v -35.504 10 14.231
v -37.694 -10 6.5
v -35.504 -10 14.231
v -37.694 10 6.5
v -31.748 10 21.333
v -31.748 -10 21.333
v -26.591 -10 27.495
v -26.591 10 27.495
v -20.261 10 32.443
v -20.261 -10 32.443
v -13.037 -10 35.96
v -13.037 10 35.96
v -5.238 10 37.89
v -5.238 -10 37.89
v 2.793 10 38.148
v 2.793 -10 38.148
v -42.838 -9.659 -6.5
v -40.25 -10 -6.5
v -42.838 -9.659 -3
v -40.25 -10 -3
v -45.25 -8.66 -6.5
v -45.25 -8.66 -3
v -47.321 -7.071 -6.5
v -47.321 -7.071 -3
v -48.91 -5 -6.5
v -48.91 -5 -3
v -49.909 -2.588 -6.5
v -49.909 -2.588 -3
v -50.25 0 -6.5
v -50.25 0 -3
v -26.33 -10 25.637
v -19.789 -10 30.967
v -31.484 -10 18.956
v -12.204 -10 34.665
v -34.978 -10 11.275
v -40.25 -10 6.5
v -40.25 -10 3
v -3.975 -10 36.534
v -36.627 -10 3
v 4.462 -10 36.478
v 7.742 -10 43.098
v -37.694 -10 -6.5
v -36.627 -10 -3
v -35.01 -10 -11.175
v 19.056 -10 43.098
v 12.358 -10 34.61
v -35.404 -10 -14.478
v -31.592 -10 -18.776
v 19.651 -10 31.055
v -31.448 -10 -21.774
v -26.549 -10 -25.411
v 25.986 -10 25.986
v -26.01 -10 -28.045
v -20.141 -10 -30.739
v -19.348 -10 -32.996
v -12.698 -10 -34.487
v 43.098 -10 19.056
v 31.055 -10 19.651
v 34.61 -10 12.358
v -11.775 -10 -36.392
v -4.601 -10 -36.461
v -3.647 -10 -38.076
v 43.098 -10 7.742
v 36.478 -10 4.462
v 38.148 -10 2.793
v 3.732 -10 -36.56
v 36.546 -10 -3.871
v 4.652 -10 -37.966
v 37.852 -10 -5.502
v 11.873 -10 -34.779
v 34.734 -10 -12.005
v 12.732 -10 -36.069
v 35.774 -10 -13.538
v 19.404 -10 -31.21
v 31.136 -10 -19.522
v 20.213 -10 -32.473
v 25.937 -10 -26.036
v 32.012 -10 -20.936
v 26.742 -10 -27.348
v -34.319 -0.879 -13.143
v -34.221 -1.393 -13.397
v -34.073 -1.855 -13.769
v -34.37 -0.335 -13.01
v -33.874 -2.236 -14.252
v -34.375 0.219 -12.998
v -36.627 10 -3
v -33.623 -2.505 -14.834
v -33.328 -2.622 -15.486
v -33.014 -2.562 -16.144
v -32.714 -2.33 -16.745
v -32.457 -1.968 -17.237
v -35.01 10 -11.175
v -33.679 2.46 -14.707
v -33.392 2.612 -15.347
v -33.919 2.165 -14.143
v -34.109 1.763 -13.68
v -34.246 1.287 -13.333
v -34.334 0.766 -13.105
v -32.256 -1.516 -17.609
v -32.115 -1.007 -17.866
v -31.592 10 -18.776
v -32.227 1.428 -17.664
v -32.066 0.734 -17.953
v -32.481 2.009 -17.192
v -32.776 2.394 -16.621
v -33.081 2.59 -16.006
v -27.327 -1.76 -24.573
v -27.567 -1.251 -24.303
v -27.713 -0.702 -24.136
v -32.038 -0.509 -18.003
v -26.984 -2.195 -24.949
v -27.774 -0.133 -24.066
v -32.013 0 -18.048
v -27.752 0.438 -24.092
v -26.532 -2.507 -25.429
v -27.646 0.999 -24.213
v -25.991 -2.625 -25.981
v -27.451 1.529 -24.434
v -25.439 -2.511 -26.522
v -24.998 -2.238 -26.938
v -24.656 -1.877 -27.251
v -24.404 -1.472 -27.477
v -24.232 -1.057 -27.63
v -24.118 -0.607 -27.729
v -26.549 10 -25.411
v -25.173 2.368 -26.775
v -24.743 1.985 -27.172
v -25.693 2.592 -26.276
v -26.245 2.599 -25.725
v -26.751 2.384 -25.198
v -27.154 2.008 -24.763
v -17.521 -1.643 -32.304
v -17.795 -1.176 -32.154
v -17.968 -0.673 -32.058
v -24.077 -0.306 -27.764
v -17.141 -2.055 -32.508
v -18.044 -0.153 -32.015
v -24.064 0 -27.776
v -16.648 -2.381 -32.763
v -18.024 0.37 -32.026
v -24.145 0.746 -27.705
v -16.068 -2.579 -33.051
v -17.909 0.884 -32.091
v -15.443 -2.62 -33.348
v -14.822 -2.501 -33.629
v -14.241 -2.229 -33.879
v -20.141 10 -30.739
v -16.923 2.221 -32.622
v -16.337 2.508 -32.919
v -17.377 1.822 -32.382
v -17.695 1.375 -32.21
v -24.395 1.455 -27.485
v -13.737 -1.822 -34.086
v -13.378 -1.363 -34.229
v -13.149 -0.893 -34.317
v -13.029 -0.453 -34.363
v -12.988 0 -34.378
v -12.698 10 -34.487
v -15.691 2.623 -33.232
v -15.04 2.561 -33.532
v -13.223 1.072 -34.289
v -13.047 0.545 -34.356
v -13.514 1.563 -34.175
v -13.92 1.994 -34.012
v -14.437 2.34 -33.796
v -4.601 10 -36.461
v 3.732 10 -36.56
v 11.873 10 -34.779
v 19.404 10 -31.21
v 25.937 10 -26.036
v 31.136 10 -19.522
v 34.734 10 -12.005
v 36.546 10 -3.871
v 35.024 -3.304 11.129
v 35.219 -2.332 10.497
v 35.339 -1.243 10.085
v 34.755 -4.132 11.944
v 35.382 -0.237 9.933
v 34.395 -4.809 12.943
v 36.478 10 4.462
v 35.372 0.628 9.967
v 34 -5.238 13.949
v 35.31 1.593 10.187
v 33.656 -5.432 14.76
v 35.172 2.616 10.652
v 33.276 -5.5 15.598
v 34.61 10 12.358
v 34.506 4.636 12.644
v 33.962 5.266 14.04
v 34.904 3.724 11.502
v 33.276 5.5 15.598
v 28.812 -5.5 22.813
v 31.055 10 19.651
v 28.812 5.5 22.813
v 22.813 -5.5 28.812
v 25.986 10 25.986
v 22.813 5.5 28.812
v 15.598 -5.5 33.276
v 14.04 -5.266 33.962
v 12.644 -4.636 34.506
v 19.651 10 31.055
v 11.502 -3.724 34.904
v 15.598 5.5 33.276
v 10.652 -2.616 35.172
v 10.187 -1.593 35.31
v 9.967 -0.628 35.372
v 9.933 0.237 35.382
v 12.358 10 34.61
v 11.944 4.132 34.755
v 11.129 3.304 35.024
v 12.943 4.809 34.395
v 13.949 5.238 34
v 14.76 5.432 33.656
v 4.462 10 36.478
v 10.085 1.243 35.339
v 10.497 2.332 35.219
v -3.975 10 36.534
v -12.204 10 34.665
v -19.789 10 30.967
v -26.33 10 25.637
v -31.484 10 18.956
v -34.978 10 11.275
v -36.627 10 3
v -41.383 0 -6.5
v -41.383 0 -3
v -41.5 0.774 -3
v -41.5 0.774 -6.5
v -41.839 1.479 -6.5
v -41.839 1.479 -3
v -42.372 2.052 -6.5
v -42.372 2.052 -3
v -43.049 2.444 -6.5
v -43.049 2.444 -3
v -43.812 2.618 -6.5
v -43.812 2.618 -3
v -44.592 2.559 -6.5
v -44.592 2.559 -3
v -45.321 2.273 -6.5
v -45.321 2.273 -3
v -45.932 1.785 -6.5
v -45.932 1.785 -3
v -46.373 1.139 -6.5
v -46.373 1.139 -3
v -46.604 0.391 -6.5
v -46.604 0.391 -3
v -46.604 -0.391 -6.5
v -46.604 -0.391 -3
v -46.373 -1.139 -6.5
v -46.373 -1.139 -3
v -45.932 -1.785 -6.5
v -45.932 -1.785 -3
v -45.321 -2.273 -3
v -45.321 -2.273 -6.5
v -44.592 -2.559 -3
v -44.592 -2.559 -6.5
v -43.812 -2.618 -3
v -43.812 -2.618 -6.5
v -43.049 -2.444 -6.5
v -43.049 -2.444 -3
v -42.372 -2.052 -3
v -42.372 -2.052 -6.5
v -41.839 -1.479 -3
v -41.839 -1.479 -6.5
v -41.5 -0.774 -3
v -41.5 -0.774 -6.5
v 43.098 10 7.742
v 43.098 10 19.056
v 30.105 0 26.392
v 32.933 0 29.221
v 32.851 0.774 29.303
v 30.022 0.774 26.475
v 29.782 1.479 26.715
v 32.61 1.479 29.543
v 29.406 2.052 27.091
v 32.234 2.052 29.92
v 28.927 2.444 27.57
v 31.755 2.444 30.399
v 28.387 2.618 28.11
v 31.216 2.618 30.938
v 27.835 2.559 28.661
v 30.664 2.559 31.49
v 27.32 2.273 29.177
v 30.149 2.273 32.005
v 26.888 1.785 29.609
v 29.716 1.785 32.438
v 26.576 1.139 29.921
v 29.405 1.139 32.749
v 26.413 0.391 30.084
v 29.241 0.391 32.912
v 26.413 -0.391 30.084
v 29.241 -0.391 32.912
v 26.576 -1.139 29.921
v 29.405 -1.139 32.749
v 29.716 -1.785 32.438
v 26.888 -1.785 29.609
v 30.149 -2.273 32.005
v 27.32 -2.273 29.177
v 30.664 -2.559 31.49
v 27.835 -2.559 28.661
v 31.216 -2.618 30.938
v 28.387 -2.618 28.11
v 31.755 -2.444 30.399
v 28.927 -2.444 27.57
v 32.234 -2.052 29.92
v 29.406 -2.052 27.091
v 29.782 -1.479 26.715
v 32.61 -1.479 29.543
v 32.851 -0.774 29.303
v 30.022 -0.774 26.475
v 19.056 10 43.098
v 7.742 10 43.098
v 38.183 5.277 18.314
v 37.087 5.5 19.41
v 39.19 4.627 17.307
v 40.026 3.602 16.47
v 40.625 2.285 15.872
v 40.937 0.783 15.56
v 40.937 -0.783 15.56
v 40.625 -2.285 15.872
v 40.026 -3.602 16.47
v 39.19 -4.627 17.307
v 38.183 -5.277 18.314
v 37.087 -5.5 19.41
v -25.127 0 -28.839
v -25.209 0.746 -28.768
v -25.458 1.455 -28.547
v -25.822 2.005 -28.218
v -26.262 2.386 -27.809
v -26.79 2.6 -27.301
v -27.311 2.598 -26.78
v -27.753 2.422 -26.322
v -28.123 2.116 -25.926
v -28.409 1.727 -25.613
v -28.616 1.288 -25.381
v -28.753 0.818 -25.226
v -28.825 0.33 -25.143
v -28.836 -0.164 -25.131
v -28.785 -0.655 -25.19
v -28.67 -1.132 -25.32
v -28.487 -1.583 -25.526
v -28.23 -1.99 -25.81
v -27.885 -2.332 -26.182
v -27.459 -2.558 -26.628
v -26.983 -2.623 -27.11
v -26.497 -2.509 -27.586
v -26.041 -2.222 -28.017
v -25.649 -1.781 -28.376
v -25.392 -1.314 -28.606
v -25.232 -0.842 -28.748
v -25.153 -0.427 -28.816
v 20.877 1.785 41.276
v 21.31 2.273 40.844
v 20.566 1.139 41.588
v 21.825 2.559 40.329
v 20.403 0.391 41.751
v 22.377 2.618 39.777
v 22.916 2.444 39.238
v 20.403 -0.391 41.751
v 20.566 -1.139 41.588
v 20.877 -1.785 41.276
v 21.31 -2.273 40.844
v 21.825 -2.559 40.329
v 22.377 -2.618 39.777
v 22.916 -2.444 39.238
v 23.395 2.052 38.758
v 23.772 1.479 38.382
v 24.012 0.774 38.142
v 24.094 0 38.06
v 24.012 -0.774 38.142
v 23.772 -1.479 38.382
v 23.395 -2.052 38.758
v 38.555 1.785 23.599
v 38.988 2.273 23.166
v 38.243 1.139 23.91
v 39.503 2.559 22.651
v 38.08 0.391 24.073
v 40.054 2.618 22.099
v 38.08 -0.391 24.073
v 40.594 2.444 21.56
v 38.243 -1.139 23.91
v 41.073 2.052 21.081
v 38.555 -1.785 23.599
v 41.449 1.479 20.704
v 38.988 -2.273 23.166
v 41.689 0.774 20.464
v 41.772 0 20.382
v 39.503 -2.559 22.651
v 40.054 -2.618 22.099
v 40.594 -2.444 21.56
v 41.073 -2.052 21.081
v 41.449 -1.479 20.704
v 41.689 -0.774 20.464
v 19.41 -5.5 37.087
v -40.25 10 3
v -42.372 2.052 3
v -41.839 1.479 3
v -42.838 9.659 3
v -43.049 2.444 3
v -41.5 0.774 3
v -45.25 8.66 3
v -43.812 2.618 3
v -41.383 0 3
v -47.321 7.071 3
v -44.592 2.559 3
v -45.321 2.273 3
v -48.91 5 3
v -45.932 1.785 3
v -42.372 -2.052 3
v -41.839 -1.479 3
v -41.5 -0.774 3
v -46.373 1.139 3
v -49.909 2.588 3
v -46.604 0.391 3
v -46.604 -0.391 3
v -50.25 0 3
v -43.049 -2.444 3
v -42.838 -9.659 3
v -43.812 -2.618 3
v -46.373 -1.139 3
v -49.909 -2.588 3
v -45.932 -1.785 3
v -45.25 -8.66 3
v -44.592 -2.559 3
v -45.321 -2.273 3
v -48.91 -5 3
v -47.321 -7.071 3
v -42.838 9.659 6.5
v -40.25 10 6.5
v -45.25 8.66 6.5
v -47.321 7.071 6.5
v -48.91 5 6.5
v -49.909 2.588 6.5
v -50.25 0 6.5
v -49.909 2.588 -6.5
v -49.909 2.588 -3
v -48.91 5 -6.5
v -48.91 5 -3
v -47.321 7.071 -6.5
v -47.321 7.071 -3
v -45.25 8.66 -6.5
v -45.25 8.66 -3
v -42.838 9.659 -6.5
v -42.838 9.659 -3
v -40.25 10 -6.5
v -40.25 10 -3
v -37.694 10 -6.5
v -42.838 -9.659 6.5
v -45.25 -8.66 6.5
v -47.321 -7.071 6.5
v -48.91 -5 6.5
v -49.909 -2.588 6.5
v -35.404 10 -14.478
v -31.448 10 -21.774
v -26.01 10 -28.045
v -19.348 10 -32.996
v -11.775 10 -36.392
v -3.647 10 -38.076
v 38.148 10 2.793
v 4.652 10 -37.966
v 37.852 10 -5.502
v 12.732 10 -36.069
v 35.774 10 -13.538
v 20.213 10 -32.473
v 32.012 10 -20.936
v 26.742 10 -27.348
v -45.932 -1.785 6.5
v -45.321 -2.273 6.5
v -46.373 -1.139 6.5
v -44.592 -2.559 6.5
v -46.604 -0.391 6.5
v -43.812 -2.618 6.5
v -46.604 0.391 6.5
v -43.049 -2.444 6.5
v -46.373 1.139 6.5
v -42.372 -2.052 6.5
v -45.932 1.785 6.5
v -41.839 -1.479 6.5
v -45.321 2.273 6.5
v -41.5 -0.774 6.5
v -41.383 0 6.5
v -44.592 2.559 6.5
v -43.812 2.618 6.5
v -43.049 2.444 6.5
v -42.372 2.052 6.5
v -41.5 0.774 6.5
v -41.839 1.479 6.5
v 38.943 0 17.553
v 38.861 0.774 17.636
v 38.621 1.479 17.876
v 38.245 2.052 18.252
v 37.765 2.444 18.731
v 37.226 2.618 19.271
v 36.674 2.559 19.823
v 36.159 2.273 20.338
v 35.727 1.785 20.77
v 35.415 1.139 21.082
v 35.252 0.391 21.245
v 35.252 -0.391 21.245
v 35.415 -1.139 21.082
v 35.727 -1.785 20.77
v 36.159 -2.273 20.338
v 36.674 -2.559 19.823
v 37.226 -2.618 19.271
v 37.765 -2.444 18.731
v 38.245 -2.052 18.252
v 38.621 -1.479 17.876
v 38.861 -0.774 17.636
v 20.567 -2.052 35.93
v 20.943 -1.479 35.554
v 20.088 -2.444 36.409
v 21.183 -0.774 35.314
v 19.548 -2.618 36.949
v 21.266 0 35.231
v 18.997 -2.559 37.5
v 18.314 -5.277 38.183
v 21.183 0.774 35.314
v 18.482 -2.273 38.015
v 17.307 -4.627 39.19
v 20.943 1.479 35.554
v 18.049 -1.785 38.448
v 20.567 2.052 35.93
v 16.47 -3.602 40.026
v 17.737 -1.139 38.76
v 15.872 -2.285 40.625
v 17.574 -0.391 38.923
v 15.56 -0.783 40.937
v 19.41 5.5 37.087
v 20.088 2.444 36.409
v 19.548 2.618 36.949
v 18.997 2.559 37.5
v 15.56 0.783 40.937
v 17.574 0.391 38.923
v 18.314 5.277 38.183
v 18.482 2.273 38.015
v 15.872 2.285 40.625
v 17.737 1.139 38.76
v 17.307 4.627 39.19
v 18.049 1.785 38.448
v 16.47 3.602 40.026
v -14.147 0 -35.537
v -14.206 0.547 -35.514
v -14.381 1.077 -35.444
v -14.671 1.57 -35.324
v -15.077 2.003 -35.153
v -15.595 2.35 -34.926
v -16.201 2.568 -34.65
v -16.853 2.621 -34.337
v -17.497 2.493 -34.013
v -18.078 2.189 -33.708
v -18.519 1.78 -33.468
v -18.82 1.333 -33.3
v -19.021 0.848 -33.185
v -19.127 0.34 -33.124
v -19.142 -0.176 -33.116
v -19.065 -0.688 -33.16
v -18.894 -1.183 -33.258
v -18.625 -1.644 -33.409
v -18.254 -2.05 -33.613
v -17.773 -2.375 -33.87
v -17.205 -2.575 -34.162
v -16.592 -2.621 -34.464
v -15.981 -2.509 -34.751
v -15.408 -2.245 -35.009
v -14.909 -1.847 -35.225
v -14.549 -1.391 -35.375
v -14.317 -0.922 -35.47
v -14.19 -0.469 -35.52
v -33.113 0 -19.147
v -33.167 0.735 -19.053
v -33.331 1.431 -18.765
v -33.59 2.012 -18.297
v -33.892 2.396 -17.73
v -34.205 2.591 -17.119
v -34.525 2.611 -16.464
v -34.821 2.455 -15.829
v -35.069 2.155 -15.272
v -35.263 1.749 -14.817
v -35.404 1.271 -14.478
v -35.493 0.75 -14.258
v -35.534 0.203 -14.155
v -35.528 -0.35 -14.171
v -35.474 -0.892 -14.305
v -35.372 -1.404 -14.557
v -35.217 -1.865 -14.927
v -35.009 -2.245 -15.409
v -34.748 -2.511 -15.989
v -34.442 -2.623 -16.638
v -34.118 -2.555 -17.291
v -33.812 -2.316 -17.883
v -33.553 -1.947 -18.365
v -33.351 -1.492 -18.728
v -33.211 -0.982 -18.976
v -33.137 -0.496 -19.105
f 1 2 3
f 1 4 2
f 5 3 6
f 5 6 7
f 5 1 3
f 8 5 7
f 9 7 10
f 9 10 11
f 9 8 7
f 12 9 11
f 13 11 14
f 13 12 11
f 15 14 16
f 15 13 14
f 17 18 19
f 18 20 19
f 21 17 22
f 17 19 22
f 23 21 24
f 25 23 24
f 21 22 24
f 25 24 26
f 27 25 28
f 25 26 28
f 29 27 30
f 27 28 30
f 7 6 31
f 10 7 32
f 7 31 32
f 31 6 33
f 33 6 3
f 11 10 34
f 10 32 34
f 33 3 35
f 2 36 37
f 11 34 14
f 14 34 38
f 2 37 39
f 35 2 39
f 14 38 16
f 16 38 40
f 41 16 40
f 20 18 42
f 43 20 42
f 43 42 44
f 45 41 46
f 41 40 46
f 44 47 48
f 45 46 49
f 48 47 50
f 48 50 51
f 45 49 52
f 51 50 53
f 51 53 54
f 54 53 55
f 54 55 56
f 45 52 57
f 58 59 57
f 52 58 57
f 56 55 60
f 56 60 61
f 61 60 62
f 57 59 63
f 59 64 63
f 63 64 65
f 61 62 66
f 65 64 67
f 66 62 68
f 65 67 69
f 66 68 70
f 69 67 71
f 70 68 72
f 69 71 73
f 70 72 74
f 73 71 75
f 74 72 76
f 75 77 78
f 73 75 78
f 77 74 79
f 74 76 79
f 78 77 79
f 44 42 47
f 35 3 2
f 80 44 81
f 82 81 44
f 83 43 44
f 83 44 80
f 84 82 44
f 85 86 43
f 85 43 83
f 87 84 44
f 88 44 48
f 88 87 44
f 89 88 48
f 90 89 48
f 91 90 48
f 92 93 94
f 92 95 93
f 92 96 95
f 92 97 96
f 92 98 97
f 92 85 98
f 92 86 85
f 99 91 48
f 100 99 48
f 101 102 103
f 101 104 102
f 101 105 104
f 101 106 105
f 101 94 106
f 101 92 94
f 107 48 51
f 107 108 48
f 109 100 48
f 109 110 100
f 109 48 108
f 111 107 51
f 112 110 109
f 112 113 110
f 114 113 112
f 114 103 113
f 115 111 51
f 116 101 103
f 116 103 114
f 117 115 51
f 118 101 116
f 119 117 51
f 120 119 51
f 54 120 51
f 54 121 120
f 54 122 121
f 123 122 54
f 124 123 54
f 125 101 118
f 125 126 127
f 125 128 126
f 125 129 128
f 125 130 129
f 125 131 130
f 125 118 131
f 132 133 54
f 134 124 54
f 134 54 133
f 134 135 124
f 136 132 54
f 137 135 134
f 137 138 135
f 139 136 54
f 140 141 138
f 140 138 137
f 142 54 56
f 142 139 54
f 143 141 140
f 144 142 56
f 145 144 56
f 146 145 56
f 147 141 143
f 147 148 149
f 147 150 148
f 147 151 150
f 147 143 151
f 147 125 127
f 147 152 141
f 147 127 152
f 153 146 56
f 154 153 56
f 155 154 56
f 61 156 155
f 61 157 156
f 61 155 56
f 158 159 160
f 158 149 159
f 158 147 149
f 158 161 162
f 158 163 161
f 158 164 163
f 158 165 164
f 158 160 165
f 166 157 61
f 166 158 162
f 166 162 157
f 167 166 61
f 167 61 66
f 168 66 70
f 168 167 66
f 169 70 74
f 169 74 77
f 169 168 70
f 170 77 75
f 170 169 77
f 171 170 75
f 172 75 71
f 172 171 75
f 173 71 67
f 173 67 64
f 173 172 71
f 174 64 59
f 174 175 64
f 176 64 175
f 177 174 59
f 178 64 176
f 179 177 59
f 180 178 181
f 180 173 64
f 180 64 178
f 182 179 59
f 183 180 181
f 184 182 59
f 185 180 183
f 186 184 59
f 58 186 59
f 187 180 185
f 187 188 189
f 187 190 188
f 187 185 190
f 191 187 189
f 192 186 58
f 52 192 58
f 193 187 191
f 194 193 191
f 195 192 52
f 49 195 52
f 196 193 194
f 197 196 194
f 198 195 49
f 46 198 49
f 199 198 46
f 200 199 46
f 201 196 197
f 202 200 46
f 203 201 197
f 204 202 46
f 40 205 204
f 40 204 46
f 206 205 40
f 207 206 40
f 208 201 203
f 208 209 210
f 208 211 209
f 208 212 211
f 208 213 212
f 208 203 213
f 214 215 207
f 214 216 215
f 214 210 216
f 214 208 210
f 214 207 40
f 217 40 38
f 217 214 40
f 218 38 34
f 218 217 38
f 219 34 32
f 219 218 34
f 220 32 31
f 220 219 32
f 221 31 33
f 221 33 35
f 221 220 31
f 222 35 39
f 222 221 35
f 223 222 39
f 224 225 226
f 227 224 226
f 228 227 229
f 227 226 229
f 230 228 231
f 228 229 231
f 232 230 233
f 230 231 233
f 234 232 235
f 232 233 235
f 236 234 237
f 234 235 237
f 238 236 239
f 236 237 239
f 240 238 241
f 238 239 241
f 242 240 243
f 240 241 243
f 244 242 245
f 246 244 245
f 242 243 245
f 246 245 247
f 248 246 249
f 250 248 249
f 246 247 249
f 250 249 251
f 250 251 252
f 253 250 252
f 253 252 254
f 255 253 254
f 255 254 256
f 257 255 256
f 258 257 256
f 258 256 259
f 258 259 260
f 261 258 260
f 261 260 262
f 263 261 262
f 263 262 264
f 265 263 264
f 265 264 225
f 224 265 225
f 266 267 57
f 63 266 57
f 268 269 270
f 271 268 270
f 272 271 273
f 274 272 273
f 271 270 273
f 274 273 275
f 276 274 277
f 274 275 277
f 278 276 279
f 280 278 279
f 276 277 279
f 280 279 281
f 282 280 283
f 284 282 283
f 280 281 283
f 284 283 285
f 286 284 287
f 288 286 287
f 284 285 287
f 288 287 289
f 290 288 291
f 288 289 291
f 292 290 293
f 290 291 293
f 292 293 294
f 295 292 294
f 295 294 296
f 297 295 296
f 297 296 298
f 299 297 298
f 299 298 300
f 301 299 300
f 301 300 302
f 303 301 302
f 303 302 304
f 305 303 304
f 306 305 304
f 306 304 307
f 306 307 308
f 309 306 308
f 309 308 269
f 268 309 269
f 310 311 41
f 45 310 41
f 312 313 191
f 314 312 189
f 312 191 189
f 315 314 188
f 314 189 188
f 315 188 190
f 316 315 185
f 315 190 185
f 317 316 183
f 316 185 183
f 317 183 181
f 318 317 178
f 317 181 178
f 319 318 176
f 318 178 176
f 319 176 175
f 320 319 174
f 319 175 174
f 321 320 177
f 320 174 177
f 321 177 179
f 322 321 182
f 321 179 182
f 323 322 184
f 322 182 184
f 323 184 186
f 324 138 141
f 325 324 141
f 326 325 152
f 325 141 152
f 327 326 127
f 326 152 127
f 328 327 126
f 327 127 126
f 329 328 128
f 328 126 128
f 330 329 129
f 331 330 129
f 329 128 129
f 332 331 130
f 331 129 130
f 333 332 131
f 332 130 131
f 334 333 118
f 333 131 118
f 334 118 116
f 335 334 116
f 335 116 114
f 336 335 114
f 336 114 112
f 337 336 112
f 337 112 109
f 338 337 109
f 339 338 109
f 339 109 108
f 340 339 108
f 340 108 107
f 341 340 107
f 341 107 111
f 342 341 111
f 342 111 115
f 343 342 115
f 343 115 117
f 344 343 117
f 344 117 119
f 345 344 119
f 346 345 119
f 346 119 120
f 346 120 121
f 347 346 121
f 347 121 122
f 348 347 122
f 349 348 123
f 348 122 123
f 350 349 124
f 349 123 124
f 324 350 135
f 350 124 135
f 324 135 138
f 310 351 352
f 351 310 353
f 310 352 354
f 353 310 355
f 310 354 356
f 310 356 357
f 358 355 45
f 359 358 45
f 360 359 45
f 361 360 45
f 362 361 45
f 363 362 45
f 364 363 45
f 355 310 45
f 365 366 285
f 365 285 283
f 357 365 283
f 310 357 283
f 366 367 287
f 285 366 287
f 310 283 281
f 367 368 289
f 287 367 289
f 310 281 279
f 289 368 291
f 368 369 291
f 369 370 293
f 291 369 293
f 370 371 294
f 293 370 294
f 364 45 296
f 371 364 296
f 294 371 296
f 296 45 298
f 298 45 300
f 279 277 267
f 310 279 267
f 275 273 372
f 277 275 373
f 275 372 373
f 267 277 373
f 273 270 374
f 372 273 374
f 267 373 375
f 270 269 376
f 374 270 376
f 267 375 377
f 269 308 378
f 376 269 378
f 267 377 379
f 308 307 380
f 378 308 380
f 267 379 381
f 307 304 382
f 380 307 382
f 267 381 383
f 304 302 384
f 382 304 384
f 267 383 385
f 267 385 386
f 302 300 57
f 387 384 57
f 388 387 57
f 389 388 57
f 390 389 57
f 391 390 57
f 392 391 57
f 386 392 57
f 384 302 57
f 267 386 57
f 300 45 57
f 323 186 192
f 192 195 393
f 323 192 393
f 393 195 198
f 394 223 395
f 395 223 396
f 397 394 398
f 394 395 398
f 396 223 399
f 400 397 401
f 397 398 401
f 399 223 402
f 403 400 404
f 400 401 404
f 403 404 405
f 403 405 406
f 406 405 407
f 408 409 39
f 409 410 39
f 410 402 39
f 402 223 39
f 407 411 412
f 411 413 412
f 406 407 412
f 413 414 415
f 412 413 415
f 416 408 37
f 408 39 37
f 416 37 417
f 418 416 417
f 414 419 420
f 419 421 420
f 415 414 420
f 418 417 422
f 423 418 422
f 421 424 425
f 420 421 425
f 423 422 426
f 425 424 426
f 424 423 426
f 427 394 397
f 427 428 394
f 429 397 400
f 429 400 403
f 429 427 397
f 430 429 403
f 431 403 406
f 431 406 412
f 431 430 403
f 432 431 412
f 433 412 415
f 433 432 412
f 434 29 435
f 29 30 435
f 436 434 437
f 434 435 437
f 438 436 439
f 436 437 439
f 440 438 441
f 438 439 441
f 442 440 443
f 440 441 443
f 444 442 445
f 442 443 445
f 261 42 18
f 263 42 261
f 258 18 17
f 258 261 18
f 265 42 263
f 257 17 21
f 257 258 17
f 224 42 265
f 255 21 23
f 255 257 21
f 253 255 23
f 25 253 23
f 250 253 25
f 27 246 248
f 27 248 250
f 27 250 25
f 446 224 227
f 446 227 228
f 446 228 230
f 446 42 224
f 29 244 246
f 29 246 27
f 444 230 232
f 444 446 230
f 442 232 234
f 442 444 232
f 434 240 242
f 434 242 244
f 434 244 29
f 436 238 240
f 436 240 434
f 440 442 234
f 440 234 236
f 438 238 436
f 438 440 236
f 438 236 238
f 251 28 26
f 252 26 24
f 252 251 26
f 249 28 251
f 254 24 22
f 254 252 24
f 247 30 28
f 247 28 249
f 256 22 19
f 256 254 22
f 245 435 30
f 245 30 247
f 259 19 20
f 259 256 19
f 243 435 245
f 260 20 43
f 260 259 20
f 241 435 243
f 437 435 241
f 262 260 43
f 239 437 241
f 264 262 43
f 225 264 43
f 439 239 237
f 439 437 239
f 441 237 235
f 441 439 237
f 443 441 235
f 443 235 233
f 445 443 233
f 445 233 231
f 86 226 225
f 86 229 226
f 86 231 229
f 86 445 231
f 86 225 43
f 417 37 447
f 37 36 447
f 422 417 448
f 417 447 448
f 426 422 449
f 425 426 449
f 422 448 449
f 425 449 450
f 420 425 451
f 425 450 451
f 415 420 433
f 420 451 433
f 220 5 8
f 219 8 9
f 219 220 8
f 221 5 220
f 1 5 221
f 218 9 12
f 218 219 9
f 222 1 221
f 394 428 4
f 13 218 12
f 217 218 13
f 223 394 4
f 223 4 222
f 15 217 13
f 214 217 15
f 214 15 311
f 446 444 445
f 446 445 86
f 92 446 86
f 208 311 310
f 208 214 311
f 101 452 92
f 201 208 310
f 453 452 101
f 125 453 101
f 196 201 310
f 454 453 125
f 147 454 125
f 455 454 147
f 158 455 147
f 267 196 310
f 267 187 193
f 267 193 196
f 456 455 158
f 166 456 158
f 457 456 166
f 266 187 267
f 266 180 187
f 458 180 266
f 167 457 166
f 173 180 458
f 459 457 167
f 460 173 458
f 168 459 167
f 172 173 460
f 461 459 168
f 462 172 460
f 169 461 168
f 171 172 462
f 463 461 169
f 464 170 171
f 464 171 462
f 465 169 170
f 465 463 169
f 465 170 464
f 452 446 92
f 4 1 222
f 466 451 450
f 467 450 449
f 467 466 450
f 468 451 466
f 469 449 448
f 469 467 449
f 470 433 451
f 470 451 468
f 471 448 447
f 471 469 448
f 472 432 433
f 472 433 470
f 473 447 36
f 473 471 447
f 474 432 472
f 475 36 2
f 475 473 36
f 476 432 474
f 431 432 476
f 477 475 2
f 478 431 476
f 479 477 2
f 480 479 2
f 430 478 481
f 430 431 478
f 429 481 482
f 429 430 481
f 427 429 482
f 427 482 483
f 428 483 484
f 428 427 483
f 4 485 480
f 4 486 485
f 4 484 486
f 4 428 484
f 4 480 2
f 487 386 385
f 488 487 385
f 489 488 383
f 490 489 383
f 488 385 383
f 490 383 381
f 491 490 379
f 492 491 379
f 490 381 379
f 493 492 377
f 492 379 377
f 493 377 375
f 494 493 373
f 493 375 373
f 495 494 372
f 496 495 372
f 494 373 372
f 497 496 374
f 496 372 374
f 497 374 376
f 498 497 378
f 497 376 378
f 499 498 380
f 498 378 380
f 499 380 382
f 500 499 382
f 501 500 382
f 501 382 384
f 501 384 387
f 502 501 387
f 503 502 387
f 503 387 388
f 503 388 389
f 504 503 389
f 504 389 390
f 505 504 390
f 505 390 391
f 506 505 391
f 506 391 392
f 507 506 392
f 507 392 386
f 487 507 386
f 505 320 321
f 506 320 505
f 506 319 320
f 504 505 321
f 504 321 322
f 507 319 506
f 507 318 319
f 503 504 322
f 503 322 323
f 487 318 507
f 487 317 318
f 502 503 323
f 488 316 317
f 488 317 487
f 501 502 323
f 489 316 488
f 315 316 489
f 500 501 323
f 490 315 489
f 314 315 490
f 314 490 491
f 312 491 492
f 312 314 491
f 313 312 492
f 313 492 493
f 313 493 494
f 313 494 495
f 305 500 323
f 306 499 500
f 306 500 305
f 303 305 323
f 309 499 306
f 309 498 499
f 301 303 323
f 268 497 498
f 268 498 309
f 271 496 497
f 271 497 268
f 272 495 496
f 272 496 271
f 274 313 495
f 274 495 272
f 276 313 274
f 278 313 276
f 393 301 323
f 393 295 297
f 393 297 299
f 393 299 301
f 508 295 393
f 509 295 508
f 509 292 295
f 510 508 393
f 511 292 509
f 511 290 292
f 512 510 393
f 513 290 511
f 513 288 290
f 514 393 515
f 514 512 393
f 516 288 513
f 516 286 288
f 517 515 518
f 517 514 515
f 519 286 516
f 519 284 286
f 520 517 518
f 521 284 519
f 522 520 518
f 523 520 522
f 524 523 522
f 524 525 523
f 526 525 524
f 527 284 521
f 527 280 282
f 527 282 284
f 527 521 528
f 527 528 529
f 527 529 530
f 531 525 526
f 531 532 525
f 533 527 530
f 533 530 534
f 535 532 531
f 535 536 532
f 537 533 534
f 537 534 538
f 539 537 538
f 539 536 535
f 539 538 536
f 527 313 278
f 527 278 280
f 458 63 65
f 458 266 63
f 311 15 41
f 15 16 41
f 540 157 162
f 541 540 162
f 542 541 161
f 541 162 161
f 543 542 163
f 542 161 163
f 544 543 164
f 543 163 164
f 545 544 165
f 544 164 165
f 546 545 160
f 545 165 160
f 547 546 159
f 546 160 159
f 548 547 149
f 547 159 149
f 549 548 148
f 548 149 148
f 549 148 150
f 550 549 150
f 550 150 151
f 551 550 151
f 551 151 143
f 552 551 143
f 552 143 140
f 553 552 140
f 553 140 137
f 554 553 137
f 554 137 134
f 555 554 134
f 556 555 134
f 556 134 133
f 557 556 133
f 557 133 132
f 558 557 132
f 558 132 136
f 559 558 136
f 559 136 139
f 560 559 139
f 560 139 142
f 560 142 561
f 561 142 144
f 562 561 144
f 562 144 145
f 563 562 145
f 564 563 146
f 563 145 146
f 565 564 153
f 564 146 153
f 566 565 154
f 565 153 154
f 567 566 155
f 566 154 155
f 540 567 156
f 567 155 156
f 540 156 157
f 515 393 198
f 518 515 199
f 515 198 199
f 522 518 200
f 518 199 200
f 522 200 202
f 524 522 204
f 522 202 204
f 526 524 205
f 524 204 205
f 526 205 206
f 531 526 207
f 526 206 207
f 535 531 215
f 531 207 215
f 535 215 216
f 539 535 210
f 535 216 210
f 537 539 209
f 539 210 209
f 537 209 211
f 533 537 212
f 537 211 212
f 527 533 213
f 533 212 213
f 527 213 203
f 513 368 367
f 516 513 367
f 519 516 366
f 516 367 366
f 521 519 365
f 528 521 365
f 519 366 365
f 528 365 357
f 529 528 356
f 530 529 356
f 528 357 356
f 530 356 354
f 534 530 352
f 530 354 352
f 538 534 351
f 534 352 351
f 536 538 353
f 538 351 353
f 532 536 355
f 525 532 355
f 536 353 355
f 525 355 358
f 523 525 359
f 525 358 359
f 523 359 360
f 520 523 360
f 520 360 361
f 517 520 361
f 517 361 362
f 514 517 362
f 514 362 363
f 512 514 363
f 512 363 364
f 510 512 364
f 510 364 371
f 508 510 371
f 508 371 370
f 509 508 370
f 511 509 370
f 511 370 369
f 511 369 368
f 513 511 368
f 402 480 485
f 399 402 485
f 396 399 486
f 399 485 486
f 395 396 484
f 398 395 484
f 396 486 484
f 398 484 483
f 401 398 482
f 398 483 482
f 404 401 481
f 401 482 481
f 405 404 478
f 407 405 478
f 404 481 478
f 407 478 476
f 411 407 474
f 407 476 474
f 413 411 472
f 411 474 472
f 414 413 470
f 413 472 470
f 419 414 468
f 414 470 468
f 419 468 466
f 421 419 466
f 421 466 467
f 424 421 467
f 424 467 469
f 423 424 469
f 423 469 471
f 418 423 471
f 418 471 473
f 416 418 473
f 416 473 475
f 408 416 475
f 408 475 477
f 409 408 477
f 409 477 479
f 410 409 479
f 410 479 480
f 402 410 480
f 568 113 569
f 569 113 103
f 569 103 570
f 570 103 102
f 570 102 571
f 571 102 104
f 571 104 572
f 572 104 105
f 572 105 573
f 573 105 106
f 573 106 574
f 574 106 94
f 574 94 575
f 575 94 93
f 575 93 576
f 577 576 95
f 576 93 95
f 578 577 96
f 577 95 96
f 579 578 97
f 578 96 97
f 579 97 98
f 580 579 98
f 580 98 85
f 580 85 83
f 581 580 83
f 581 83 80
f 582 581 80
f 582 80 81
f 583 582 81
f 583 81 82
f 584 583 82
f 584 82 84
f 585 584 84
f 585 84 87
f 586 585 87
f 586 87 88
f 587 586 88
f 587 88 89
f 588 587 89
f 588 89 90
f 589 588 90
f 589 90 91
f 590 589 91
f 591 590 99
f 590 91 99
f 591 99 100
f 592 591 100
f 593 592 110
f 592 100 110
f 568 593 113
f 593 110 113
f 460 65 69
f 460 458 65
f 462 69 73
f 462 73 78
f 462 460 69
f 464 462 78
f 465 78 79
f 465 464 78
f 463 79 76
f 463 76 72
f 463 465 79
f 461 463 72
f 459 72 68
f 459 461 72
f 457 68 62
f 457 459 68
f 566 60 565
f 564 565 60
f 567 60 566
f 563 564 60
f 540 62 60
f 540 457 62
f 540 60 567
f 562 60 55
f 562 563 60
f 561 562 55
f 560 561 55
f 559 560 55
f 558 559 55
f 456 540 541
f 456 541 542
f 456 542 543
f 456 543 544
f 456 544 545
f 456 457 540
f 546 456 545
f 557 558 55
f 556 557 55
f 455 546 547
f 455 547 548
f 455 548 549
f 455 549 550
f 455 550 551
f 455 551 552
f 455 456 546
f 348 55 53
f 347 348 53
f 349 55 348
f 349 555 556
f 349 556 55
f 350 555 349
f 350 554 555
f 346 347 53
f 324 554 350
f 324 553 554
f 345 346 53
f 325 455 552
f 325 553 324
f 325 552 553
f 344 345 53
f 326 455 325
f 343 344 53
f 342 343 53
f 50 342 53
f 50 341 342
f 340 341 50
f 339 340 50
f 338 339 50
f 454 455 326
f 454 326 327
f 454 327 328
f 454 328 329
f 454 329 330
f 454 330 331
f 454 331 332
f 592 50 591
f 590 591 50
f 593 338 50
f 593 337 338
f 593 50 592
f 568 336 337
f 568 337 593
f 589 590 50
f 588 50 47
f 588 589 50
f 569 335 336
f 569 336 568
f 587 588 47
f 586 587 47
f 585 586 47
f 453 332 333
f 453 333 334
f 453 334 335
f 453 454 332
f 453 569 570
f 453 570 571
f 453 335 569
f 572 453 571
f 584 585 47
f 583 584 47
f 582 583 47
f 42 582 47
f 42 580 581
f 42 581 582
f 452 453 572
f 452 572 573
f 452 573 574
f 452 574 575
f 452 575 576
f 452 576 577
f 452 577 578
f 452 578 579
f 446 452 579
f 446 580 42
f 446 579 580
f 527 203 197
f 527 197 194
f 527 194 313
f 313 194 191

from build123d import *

# Parameters (mm, degrees)
BOSS_EXTRUDE1_DEPTH = 10
SKETCH2_R           = 2.625
CUT_EXTRUDE1_DEPTH  = 69.02664919
SKETCH3_R           = 2.625
CUT_EXTRUDE2_DEPTH  = 108.332520819
CUT_EXTRUDE3_DEPTH  = 11
FILLET1_R           = 10
CHAMFER1_SIZE       = 8


with BuildPart() as part:
    # Sketch1 → Boss-Extrude1 (new, symmetric)
    with BuildSketch(Plane(origin=(0, 0, 0), x_dir=(1, 0, 0), z_dir=(0, 1, 0))):
        with BuildLine():
            Line((-37.693666577, 6.5), (-50.25, 6.5))
            Line((-50.25, 6.5), (-50.25, 3))
            Line((-50.25, 3), (-36.627346341, 3))
            ThreePointArc((-36.627346341, 3), (3.731967617, 36.560018021), (36.478063401, -4.462442214))
            Line((36.478063401, -4.462442214), (38.147922337, -2.792583278))
            ThreePointArc((38.147922337, -2.792583278), (4.651839751, 37.966075474), (-37.693666577, 6.5))
        make_face()
        with BuildLine():
            Line((48.754524055, -13.399184996), (38.147922337, -2.792583278))
            ThreePointArc((38.147922337, -2.792583278), (27.04683438, -27.04683438), (2.792583278, -38.147922337))
            Line((2.792583278, -38.147922337), (13.399184996, -48.754524055))
            Line((13.399184996, -48.754524055), (48.754524055, -13.399184996))
        make_face()
        with BuildLine():
            ThreePointArc((-37.693666577, -6.5), (-23.55672199, -30.135416856), (2.792583278, -38.147922337))
            Line((2.792583278, -38.147922337), (4.462442214, -36.478063401))
            ThreePointArc((4.462442214, -36.478063401), (-23.212937054, -28.490736272), (-36.627346341, -3))
            Line((-36.627346341, -3), (-50.25, -3))
            Line((-50.25, -3), (-50.25, -6.5))
            Line((-50.25, -6.5), (-37.693666577, -6.5))
        make_face()
        with BuildLine():
            ThreePointArc((2.792583278, -38.147922337), (27.04683438, -27.04683438), (38.147922337, -2.792583278))
            Line((38.147922337, -2.792583278), (36.478063401, -4.462442214))
            ThreePointArc((36.478063401, -4.462442214), (25.986174209, -25.986174209), (4.462442214, -36.478063401))
            Line((4.462442214, -36.478063401), (2.792583278, -38.147922337))
        make_face()
    extrude(amount=BOSS_EXTRUDE1_DEPTH, both=True)

    # Sketch2 → Cut-Extrude1 (cut, through all)
    with BuildSketch(Plane.XY.offset(6.5)):
        with Locations((-44.008194531, 0)):
            Circle(SKETCH2_R)
    extrude(amount=-CUT_EXTRUDE1_DEPTH, mode=Mode.SUBTRACT)

    # Sketch3 → Cut-Extrude2 (cut, through all)
    with BuildSketch(Plane(origin=(31.076854525, 0, 31.076854525), x_dir=(0.7071067811865457, 0, -0.7071067811865496), z_dir=(0.7071067811865496, 0, 0.7071067811865457))):
        Circle(SKETCH3_R)
        with Locations((-12.5, 0)):
            Circle(SKETCH3_R)
        with Locations((12.5, 0)):
            Circle(SKETCH3_R)
    extrude(amount=-CUT_EXTRUDE2_DEPTH, mode=Mode.SUBTRACT)

    # Sketch6 → Cut-Extrude3 (cut)
    with BuildSketch(Plane(origin=(20.470252807, 0, 20.470252807), x_dir=(0.7071067811865457, 0, -0.7071067811865495), z_dir=(0.7071067811865495, 0, 0.7071067811865457))):
        with BuildLine():
            Line((12.5, -5.5), (-12.5, -5.5))
            ThreePointArc((-12.5, -5.5), (-18, 0), (-12.5, 5.5))
            Line((-12.5, 5.5), (12.5, 5.5))
            ThreePointArc((12.5, 5.5), (18, 0), (12.5, -5.5))
        make_face()
    extrude(amount=CUT_EXTRUDE3_DEPTH, mode=Mode.SUBTRACT)

    # Fillet1
    fillet1_edges = [part.edges().sort_by_distance(p)[0] for p in [
        (-50.25, -10, 4.75),
        (-50.25, 10, 4.75),
        (-50.25, -10, -4.75),
        (-50.25, 10, -4.75),
    ]]
    fillet(fillet1_edges, radius=FILLET1_R - 0.0001)  # a hair under: the kernel refuses the full size

    # Chamfer1
    chamfer1_edges = [part.edges().sort_by_distance(p)[0] for p in [
        (48.754524055, 0, 13.399184996),
        (13.399184996, 0, 48.754524055),
    ]]
    chamfer(chamfer1_edges, length=CHAMFER1_SIZE)


solid = part.part
